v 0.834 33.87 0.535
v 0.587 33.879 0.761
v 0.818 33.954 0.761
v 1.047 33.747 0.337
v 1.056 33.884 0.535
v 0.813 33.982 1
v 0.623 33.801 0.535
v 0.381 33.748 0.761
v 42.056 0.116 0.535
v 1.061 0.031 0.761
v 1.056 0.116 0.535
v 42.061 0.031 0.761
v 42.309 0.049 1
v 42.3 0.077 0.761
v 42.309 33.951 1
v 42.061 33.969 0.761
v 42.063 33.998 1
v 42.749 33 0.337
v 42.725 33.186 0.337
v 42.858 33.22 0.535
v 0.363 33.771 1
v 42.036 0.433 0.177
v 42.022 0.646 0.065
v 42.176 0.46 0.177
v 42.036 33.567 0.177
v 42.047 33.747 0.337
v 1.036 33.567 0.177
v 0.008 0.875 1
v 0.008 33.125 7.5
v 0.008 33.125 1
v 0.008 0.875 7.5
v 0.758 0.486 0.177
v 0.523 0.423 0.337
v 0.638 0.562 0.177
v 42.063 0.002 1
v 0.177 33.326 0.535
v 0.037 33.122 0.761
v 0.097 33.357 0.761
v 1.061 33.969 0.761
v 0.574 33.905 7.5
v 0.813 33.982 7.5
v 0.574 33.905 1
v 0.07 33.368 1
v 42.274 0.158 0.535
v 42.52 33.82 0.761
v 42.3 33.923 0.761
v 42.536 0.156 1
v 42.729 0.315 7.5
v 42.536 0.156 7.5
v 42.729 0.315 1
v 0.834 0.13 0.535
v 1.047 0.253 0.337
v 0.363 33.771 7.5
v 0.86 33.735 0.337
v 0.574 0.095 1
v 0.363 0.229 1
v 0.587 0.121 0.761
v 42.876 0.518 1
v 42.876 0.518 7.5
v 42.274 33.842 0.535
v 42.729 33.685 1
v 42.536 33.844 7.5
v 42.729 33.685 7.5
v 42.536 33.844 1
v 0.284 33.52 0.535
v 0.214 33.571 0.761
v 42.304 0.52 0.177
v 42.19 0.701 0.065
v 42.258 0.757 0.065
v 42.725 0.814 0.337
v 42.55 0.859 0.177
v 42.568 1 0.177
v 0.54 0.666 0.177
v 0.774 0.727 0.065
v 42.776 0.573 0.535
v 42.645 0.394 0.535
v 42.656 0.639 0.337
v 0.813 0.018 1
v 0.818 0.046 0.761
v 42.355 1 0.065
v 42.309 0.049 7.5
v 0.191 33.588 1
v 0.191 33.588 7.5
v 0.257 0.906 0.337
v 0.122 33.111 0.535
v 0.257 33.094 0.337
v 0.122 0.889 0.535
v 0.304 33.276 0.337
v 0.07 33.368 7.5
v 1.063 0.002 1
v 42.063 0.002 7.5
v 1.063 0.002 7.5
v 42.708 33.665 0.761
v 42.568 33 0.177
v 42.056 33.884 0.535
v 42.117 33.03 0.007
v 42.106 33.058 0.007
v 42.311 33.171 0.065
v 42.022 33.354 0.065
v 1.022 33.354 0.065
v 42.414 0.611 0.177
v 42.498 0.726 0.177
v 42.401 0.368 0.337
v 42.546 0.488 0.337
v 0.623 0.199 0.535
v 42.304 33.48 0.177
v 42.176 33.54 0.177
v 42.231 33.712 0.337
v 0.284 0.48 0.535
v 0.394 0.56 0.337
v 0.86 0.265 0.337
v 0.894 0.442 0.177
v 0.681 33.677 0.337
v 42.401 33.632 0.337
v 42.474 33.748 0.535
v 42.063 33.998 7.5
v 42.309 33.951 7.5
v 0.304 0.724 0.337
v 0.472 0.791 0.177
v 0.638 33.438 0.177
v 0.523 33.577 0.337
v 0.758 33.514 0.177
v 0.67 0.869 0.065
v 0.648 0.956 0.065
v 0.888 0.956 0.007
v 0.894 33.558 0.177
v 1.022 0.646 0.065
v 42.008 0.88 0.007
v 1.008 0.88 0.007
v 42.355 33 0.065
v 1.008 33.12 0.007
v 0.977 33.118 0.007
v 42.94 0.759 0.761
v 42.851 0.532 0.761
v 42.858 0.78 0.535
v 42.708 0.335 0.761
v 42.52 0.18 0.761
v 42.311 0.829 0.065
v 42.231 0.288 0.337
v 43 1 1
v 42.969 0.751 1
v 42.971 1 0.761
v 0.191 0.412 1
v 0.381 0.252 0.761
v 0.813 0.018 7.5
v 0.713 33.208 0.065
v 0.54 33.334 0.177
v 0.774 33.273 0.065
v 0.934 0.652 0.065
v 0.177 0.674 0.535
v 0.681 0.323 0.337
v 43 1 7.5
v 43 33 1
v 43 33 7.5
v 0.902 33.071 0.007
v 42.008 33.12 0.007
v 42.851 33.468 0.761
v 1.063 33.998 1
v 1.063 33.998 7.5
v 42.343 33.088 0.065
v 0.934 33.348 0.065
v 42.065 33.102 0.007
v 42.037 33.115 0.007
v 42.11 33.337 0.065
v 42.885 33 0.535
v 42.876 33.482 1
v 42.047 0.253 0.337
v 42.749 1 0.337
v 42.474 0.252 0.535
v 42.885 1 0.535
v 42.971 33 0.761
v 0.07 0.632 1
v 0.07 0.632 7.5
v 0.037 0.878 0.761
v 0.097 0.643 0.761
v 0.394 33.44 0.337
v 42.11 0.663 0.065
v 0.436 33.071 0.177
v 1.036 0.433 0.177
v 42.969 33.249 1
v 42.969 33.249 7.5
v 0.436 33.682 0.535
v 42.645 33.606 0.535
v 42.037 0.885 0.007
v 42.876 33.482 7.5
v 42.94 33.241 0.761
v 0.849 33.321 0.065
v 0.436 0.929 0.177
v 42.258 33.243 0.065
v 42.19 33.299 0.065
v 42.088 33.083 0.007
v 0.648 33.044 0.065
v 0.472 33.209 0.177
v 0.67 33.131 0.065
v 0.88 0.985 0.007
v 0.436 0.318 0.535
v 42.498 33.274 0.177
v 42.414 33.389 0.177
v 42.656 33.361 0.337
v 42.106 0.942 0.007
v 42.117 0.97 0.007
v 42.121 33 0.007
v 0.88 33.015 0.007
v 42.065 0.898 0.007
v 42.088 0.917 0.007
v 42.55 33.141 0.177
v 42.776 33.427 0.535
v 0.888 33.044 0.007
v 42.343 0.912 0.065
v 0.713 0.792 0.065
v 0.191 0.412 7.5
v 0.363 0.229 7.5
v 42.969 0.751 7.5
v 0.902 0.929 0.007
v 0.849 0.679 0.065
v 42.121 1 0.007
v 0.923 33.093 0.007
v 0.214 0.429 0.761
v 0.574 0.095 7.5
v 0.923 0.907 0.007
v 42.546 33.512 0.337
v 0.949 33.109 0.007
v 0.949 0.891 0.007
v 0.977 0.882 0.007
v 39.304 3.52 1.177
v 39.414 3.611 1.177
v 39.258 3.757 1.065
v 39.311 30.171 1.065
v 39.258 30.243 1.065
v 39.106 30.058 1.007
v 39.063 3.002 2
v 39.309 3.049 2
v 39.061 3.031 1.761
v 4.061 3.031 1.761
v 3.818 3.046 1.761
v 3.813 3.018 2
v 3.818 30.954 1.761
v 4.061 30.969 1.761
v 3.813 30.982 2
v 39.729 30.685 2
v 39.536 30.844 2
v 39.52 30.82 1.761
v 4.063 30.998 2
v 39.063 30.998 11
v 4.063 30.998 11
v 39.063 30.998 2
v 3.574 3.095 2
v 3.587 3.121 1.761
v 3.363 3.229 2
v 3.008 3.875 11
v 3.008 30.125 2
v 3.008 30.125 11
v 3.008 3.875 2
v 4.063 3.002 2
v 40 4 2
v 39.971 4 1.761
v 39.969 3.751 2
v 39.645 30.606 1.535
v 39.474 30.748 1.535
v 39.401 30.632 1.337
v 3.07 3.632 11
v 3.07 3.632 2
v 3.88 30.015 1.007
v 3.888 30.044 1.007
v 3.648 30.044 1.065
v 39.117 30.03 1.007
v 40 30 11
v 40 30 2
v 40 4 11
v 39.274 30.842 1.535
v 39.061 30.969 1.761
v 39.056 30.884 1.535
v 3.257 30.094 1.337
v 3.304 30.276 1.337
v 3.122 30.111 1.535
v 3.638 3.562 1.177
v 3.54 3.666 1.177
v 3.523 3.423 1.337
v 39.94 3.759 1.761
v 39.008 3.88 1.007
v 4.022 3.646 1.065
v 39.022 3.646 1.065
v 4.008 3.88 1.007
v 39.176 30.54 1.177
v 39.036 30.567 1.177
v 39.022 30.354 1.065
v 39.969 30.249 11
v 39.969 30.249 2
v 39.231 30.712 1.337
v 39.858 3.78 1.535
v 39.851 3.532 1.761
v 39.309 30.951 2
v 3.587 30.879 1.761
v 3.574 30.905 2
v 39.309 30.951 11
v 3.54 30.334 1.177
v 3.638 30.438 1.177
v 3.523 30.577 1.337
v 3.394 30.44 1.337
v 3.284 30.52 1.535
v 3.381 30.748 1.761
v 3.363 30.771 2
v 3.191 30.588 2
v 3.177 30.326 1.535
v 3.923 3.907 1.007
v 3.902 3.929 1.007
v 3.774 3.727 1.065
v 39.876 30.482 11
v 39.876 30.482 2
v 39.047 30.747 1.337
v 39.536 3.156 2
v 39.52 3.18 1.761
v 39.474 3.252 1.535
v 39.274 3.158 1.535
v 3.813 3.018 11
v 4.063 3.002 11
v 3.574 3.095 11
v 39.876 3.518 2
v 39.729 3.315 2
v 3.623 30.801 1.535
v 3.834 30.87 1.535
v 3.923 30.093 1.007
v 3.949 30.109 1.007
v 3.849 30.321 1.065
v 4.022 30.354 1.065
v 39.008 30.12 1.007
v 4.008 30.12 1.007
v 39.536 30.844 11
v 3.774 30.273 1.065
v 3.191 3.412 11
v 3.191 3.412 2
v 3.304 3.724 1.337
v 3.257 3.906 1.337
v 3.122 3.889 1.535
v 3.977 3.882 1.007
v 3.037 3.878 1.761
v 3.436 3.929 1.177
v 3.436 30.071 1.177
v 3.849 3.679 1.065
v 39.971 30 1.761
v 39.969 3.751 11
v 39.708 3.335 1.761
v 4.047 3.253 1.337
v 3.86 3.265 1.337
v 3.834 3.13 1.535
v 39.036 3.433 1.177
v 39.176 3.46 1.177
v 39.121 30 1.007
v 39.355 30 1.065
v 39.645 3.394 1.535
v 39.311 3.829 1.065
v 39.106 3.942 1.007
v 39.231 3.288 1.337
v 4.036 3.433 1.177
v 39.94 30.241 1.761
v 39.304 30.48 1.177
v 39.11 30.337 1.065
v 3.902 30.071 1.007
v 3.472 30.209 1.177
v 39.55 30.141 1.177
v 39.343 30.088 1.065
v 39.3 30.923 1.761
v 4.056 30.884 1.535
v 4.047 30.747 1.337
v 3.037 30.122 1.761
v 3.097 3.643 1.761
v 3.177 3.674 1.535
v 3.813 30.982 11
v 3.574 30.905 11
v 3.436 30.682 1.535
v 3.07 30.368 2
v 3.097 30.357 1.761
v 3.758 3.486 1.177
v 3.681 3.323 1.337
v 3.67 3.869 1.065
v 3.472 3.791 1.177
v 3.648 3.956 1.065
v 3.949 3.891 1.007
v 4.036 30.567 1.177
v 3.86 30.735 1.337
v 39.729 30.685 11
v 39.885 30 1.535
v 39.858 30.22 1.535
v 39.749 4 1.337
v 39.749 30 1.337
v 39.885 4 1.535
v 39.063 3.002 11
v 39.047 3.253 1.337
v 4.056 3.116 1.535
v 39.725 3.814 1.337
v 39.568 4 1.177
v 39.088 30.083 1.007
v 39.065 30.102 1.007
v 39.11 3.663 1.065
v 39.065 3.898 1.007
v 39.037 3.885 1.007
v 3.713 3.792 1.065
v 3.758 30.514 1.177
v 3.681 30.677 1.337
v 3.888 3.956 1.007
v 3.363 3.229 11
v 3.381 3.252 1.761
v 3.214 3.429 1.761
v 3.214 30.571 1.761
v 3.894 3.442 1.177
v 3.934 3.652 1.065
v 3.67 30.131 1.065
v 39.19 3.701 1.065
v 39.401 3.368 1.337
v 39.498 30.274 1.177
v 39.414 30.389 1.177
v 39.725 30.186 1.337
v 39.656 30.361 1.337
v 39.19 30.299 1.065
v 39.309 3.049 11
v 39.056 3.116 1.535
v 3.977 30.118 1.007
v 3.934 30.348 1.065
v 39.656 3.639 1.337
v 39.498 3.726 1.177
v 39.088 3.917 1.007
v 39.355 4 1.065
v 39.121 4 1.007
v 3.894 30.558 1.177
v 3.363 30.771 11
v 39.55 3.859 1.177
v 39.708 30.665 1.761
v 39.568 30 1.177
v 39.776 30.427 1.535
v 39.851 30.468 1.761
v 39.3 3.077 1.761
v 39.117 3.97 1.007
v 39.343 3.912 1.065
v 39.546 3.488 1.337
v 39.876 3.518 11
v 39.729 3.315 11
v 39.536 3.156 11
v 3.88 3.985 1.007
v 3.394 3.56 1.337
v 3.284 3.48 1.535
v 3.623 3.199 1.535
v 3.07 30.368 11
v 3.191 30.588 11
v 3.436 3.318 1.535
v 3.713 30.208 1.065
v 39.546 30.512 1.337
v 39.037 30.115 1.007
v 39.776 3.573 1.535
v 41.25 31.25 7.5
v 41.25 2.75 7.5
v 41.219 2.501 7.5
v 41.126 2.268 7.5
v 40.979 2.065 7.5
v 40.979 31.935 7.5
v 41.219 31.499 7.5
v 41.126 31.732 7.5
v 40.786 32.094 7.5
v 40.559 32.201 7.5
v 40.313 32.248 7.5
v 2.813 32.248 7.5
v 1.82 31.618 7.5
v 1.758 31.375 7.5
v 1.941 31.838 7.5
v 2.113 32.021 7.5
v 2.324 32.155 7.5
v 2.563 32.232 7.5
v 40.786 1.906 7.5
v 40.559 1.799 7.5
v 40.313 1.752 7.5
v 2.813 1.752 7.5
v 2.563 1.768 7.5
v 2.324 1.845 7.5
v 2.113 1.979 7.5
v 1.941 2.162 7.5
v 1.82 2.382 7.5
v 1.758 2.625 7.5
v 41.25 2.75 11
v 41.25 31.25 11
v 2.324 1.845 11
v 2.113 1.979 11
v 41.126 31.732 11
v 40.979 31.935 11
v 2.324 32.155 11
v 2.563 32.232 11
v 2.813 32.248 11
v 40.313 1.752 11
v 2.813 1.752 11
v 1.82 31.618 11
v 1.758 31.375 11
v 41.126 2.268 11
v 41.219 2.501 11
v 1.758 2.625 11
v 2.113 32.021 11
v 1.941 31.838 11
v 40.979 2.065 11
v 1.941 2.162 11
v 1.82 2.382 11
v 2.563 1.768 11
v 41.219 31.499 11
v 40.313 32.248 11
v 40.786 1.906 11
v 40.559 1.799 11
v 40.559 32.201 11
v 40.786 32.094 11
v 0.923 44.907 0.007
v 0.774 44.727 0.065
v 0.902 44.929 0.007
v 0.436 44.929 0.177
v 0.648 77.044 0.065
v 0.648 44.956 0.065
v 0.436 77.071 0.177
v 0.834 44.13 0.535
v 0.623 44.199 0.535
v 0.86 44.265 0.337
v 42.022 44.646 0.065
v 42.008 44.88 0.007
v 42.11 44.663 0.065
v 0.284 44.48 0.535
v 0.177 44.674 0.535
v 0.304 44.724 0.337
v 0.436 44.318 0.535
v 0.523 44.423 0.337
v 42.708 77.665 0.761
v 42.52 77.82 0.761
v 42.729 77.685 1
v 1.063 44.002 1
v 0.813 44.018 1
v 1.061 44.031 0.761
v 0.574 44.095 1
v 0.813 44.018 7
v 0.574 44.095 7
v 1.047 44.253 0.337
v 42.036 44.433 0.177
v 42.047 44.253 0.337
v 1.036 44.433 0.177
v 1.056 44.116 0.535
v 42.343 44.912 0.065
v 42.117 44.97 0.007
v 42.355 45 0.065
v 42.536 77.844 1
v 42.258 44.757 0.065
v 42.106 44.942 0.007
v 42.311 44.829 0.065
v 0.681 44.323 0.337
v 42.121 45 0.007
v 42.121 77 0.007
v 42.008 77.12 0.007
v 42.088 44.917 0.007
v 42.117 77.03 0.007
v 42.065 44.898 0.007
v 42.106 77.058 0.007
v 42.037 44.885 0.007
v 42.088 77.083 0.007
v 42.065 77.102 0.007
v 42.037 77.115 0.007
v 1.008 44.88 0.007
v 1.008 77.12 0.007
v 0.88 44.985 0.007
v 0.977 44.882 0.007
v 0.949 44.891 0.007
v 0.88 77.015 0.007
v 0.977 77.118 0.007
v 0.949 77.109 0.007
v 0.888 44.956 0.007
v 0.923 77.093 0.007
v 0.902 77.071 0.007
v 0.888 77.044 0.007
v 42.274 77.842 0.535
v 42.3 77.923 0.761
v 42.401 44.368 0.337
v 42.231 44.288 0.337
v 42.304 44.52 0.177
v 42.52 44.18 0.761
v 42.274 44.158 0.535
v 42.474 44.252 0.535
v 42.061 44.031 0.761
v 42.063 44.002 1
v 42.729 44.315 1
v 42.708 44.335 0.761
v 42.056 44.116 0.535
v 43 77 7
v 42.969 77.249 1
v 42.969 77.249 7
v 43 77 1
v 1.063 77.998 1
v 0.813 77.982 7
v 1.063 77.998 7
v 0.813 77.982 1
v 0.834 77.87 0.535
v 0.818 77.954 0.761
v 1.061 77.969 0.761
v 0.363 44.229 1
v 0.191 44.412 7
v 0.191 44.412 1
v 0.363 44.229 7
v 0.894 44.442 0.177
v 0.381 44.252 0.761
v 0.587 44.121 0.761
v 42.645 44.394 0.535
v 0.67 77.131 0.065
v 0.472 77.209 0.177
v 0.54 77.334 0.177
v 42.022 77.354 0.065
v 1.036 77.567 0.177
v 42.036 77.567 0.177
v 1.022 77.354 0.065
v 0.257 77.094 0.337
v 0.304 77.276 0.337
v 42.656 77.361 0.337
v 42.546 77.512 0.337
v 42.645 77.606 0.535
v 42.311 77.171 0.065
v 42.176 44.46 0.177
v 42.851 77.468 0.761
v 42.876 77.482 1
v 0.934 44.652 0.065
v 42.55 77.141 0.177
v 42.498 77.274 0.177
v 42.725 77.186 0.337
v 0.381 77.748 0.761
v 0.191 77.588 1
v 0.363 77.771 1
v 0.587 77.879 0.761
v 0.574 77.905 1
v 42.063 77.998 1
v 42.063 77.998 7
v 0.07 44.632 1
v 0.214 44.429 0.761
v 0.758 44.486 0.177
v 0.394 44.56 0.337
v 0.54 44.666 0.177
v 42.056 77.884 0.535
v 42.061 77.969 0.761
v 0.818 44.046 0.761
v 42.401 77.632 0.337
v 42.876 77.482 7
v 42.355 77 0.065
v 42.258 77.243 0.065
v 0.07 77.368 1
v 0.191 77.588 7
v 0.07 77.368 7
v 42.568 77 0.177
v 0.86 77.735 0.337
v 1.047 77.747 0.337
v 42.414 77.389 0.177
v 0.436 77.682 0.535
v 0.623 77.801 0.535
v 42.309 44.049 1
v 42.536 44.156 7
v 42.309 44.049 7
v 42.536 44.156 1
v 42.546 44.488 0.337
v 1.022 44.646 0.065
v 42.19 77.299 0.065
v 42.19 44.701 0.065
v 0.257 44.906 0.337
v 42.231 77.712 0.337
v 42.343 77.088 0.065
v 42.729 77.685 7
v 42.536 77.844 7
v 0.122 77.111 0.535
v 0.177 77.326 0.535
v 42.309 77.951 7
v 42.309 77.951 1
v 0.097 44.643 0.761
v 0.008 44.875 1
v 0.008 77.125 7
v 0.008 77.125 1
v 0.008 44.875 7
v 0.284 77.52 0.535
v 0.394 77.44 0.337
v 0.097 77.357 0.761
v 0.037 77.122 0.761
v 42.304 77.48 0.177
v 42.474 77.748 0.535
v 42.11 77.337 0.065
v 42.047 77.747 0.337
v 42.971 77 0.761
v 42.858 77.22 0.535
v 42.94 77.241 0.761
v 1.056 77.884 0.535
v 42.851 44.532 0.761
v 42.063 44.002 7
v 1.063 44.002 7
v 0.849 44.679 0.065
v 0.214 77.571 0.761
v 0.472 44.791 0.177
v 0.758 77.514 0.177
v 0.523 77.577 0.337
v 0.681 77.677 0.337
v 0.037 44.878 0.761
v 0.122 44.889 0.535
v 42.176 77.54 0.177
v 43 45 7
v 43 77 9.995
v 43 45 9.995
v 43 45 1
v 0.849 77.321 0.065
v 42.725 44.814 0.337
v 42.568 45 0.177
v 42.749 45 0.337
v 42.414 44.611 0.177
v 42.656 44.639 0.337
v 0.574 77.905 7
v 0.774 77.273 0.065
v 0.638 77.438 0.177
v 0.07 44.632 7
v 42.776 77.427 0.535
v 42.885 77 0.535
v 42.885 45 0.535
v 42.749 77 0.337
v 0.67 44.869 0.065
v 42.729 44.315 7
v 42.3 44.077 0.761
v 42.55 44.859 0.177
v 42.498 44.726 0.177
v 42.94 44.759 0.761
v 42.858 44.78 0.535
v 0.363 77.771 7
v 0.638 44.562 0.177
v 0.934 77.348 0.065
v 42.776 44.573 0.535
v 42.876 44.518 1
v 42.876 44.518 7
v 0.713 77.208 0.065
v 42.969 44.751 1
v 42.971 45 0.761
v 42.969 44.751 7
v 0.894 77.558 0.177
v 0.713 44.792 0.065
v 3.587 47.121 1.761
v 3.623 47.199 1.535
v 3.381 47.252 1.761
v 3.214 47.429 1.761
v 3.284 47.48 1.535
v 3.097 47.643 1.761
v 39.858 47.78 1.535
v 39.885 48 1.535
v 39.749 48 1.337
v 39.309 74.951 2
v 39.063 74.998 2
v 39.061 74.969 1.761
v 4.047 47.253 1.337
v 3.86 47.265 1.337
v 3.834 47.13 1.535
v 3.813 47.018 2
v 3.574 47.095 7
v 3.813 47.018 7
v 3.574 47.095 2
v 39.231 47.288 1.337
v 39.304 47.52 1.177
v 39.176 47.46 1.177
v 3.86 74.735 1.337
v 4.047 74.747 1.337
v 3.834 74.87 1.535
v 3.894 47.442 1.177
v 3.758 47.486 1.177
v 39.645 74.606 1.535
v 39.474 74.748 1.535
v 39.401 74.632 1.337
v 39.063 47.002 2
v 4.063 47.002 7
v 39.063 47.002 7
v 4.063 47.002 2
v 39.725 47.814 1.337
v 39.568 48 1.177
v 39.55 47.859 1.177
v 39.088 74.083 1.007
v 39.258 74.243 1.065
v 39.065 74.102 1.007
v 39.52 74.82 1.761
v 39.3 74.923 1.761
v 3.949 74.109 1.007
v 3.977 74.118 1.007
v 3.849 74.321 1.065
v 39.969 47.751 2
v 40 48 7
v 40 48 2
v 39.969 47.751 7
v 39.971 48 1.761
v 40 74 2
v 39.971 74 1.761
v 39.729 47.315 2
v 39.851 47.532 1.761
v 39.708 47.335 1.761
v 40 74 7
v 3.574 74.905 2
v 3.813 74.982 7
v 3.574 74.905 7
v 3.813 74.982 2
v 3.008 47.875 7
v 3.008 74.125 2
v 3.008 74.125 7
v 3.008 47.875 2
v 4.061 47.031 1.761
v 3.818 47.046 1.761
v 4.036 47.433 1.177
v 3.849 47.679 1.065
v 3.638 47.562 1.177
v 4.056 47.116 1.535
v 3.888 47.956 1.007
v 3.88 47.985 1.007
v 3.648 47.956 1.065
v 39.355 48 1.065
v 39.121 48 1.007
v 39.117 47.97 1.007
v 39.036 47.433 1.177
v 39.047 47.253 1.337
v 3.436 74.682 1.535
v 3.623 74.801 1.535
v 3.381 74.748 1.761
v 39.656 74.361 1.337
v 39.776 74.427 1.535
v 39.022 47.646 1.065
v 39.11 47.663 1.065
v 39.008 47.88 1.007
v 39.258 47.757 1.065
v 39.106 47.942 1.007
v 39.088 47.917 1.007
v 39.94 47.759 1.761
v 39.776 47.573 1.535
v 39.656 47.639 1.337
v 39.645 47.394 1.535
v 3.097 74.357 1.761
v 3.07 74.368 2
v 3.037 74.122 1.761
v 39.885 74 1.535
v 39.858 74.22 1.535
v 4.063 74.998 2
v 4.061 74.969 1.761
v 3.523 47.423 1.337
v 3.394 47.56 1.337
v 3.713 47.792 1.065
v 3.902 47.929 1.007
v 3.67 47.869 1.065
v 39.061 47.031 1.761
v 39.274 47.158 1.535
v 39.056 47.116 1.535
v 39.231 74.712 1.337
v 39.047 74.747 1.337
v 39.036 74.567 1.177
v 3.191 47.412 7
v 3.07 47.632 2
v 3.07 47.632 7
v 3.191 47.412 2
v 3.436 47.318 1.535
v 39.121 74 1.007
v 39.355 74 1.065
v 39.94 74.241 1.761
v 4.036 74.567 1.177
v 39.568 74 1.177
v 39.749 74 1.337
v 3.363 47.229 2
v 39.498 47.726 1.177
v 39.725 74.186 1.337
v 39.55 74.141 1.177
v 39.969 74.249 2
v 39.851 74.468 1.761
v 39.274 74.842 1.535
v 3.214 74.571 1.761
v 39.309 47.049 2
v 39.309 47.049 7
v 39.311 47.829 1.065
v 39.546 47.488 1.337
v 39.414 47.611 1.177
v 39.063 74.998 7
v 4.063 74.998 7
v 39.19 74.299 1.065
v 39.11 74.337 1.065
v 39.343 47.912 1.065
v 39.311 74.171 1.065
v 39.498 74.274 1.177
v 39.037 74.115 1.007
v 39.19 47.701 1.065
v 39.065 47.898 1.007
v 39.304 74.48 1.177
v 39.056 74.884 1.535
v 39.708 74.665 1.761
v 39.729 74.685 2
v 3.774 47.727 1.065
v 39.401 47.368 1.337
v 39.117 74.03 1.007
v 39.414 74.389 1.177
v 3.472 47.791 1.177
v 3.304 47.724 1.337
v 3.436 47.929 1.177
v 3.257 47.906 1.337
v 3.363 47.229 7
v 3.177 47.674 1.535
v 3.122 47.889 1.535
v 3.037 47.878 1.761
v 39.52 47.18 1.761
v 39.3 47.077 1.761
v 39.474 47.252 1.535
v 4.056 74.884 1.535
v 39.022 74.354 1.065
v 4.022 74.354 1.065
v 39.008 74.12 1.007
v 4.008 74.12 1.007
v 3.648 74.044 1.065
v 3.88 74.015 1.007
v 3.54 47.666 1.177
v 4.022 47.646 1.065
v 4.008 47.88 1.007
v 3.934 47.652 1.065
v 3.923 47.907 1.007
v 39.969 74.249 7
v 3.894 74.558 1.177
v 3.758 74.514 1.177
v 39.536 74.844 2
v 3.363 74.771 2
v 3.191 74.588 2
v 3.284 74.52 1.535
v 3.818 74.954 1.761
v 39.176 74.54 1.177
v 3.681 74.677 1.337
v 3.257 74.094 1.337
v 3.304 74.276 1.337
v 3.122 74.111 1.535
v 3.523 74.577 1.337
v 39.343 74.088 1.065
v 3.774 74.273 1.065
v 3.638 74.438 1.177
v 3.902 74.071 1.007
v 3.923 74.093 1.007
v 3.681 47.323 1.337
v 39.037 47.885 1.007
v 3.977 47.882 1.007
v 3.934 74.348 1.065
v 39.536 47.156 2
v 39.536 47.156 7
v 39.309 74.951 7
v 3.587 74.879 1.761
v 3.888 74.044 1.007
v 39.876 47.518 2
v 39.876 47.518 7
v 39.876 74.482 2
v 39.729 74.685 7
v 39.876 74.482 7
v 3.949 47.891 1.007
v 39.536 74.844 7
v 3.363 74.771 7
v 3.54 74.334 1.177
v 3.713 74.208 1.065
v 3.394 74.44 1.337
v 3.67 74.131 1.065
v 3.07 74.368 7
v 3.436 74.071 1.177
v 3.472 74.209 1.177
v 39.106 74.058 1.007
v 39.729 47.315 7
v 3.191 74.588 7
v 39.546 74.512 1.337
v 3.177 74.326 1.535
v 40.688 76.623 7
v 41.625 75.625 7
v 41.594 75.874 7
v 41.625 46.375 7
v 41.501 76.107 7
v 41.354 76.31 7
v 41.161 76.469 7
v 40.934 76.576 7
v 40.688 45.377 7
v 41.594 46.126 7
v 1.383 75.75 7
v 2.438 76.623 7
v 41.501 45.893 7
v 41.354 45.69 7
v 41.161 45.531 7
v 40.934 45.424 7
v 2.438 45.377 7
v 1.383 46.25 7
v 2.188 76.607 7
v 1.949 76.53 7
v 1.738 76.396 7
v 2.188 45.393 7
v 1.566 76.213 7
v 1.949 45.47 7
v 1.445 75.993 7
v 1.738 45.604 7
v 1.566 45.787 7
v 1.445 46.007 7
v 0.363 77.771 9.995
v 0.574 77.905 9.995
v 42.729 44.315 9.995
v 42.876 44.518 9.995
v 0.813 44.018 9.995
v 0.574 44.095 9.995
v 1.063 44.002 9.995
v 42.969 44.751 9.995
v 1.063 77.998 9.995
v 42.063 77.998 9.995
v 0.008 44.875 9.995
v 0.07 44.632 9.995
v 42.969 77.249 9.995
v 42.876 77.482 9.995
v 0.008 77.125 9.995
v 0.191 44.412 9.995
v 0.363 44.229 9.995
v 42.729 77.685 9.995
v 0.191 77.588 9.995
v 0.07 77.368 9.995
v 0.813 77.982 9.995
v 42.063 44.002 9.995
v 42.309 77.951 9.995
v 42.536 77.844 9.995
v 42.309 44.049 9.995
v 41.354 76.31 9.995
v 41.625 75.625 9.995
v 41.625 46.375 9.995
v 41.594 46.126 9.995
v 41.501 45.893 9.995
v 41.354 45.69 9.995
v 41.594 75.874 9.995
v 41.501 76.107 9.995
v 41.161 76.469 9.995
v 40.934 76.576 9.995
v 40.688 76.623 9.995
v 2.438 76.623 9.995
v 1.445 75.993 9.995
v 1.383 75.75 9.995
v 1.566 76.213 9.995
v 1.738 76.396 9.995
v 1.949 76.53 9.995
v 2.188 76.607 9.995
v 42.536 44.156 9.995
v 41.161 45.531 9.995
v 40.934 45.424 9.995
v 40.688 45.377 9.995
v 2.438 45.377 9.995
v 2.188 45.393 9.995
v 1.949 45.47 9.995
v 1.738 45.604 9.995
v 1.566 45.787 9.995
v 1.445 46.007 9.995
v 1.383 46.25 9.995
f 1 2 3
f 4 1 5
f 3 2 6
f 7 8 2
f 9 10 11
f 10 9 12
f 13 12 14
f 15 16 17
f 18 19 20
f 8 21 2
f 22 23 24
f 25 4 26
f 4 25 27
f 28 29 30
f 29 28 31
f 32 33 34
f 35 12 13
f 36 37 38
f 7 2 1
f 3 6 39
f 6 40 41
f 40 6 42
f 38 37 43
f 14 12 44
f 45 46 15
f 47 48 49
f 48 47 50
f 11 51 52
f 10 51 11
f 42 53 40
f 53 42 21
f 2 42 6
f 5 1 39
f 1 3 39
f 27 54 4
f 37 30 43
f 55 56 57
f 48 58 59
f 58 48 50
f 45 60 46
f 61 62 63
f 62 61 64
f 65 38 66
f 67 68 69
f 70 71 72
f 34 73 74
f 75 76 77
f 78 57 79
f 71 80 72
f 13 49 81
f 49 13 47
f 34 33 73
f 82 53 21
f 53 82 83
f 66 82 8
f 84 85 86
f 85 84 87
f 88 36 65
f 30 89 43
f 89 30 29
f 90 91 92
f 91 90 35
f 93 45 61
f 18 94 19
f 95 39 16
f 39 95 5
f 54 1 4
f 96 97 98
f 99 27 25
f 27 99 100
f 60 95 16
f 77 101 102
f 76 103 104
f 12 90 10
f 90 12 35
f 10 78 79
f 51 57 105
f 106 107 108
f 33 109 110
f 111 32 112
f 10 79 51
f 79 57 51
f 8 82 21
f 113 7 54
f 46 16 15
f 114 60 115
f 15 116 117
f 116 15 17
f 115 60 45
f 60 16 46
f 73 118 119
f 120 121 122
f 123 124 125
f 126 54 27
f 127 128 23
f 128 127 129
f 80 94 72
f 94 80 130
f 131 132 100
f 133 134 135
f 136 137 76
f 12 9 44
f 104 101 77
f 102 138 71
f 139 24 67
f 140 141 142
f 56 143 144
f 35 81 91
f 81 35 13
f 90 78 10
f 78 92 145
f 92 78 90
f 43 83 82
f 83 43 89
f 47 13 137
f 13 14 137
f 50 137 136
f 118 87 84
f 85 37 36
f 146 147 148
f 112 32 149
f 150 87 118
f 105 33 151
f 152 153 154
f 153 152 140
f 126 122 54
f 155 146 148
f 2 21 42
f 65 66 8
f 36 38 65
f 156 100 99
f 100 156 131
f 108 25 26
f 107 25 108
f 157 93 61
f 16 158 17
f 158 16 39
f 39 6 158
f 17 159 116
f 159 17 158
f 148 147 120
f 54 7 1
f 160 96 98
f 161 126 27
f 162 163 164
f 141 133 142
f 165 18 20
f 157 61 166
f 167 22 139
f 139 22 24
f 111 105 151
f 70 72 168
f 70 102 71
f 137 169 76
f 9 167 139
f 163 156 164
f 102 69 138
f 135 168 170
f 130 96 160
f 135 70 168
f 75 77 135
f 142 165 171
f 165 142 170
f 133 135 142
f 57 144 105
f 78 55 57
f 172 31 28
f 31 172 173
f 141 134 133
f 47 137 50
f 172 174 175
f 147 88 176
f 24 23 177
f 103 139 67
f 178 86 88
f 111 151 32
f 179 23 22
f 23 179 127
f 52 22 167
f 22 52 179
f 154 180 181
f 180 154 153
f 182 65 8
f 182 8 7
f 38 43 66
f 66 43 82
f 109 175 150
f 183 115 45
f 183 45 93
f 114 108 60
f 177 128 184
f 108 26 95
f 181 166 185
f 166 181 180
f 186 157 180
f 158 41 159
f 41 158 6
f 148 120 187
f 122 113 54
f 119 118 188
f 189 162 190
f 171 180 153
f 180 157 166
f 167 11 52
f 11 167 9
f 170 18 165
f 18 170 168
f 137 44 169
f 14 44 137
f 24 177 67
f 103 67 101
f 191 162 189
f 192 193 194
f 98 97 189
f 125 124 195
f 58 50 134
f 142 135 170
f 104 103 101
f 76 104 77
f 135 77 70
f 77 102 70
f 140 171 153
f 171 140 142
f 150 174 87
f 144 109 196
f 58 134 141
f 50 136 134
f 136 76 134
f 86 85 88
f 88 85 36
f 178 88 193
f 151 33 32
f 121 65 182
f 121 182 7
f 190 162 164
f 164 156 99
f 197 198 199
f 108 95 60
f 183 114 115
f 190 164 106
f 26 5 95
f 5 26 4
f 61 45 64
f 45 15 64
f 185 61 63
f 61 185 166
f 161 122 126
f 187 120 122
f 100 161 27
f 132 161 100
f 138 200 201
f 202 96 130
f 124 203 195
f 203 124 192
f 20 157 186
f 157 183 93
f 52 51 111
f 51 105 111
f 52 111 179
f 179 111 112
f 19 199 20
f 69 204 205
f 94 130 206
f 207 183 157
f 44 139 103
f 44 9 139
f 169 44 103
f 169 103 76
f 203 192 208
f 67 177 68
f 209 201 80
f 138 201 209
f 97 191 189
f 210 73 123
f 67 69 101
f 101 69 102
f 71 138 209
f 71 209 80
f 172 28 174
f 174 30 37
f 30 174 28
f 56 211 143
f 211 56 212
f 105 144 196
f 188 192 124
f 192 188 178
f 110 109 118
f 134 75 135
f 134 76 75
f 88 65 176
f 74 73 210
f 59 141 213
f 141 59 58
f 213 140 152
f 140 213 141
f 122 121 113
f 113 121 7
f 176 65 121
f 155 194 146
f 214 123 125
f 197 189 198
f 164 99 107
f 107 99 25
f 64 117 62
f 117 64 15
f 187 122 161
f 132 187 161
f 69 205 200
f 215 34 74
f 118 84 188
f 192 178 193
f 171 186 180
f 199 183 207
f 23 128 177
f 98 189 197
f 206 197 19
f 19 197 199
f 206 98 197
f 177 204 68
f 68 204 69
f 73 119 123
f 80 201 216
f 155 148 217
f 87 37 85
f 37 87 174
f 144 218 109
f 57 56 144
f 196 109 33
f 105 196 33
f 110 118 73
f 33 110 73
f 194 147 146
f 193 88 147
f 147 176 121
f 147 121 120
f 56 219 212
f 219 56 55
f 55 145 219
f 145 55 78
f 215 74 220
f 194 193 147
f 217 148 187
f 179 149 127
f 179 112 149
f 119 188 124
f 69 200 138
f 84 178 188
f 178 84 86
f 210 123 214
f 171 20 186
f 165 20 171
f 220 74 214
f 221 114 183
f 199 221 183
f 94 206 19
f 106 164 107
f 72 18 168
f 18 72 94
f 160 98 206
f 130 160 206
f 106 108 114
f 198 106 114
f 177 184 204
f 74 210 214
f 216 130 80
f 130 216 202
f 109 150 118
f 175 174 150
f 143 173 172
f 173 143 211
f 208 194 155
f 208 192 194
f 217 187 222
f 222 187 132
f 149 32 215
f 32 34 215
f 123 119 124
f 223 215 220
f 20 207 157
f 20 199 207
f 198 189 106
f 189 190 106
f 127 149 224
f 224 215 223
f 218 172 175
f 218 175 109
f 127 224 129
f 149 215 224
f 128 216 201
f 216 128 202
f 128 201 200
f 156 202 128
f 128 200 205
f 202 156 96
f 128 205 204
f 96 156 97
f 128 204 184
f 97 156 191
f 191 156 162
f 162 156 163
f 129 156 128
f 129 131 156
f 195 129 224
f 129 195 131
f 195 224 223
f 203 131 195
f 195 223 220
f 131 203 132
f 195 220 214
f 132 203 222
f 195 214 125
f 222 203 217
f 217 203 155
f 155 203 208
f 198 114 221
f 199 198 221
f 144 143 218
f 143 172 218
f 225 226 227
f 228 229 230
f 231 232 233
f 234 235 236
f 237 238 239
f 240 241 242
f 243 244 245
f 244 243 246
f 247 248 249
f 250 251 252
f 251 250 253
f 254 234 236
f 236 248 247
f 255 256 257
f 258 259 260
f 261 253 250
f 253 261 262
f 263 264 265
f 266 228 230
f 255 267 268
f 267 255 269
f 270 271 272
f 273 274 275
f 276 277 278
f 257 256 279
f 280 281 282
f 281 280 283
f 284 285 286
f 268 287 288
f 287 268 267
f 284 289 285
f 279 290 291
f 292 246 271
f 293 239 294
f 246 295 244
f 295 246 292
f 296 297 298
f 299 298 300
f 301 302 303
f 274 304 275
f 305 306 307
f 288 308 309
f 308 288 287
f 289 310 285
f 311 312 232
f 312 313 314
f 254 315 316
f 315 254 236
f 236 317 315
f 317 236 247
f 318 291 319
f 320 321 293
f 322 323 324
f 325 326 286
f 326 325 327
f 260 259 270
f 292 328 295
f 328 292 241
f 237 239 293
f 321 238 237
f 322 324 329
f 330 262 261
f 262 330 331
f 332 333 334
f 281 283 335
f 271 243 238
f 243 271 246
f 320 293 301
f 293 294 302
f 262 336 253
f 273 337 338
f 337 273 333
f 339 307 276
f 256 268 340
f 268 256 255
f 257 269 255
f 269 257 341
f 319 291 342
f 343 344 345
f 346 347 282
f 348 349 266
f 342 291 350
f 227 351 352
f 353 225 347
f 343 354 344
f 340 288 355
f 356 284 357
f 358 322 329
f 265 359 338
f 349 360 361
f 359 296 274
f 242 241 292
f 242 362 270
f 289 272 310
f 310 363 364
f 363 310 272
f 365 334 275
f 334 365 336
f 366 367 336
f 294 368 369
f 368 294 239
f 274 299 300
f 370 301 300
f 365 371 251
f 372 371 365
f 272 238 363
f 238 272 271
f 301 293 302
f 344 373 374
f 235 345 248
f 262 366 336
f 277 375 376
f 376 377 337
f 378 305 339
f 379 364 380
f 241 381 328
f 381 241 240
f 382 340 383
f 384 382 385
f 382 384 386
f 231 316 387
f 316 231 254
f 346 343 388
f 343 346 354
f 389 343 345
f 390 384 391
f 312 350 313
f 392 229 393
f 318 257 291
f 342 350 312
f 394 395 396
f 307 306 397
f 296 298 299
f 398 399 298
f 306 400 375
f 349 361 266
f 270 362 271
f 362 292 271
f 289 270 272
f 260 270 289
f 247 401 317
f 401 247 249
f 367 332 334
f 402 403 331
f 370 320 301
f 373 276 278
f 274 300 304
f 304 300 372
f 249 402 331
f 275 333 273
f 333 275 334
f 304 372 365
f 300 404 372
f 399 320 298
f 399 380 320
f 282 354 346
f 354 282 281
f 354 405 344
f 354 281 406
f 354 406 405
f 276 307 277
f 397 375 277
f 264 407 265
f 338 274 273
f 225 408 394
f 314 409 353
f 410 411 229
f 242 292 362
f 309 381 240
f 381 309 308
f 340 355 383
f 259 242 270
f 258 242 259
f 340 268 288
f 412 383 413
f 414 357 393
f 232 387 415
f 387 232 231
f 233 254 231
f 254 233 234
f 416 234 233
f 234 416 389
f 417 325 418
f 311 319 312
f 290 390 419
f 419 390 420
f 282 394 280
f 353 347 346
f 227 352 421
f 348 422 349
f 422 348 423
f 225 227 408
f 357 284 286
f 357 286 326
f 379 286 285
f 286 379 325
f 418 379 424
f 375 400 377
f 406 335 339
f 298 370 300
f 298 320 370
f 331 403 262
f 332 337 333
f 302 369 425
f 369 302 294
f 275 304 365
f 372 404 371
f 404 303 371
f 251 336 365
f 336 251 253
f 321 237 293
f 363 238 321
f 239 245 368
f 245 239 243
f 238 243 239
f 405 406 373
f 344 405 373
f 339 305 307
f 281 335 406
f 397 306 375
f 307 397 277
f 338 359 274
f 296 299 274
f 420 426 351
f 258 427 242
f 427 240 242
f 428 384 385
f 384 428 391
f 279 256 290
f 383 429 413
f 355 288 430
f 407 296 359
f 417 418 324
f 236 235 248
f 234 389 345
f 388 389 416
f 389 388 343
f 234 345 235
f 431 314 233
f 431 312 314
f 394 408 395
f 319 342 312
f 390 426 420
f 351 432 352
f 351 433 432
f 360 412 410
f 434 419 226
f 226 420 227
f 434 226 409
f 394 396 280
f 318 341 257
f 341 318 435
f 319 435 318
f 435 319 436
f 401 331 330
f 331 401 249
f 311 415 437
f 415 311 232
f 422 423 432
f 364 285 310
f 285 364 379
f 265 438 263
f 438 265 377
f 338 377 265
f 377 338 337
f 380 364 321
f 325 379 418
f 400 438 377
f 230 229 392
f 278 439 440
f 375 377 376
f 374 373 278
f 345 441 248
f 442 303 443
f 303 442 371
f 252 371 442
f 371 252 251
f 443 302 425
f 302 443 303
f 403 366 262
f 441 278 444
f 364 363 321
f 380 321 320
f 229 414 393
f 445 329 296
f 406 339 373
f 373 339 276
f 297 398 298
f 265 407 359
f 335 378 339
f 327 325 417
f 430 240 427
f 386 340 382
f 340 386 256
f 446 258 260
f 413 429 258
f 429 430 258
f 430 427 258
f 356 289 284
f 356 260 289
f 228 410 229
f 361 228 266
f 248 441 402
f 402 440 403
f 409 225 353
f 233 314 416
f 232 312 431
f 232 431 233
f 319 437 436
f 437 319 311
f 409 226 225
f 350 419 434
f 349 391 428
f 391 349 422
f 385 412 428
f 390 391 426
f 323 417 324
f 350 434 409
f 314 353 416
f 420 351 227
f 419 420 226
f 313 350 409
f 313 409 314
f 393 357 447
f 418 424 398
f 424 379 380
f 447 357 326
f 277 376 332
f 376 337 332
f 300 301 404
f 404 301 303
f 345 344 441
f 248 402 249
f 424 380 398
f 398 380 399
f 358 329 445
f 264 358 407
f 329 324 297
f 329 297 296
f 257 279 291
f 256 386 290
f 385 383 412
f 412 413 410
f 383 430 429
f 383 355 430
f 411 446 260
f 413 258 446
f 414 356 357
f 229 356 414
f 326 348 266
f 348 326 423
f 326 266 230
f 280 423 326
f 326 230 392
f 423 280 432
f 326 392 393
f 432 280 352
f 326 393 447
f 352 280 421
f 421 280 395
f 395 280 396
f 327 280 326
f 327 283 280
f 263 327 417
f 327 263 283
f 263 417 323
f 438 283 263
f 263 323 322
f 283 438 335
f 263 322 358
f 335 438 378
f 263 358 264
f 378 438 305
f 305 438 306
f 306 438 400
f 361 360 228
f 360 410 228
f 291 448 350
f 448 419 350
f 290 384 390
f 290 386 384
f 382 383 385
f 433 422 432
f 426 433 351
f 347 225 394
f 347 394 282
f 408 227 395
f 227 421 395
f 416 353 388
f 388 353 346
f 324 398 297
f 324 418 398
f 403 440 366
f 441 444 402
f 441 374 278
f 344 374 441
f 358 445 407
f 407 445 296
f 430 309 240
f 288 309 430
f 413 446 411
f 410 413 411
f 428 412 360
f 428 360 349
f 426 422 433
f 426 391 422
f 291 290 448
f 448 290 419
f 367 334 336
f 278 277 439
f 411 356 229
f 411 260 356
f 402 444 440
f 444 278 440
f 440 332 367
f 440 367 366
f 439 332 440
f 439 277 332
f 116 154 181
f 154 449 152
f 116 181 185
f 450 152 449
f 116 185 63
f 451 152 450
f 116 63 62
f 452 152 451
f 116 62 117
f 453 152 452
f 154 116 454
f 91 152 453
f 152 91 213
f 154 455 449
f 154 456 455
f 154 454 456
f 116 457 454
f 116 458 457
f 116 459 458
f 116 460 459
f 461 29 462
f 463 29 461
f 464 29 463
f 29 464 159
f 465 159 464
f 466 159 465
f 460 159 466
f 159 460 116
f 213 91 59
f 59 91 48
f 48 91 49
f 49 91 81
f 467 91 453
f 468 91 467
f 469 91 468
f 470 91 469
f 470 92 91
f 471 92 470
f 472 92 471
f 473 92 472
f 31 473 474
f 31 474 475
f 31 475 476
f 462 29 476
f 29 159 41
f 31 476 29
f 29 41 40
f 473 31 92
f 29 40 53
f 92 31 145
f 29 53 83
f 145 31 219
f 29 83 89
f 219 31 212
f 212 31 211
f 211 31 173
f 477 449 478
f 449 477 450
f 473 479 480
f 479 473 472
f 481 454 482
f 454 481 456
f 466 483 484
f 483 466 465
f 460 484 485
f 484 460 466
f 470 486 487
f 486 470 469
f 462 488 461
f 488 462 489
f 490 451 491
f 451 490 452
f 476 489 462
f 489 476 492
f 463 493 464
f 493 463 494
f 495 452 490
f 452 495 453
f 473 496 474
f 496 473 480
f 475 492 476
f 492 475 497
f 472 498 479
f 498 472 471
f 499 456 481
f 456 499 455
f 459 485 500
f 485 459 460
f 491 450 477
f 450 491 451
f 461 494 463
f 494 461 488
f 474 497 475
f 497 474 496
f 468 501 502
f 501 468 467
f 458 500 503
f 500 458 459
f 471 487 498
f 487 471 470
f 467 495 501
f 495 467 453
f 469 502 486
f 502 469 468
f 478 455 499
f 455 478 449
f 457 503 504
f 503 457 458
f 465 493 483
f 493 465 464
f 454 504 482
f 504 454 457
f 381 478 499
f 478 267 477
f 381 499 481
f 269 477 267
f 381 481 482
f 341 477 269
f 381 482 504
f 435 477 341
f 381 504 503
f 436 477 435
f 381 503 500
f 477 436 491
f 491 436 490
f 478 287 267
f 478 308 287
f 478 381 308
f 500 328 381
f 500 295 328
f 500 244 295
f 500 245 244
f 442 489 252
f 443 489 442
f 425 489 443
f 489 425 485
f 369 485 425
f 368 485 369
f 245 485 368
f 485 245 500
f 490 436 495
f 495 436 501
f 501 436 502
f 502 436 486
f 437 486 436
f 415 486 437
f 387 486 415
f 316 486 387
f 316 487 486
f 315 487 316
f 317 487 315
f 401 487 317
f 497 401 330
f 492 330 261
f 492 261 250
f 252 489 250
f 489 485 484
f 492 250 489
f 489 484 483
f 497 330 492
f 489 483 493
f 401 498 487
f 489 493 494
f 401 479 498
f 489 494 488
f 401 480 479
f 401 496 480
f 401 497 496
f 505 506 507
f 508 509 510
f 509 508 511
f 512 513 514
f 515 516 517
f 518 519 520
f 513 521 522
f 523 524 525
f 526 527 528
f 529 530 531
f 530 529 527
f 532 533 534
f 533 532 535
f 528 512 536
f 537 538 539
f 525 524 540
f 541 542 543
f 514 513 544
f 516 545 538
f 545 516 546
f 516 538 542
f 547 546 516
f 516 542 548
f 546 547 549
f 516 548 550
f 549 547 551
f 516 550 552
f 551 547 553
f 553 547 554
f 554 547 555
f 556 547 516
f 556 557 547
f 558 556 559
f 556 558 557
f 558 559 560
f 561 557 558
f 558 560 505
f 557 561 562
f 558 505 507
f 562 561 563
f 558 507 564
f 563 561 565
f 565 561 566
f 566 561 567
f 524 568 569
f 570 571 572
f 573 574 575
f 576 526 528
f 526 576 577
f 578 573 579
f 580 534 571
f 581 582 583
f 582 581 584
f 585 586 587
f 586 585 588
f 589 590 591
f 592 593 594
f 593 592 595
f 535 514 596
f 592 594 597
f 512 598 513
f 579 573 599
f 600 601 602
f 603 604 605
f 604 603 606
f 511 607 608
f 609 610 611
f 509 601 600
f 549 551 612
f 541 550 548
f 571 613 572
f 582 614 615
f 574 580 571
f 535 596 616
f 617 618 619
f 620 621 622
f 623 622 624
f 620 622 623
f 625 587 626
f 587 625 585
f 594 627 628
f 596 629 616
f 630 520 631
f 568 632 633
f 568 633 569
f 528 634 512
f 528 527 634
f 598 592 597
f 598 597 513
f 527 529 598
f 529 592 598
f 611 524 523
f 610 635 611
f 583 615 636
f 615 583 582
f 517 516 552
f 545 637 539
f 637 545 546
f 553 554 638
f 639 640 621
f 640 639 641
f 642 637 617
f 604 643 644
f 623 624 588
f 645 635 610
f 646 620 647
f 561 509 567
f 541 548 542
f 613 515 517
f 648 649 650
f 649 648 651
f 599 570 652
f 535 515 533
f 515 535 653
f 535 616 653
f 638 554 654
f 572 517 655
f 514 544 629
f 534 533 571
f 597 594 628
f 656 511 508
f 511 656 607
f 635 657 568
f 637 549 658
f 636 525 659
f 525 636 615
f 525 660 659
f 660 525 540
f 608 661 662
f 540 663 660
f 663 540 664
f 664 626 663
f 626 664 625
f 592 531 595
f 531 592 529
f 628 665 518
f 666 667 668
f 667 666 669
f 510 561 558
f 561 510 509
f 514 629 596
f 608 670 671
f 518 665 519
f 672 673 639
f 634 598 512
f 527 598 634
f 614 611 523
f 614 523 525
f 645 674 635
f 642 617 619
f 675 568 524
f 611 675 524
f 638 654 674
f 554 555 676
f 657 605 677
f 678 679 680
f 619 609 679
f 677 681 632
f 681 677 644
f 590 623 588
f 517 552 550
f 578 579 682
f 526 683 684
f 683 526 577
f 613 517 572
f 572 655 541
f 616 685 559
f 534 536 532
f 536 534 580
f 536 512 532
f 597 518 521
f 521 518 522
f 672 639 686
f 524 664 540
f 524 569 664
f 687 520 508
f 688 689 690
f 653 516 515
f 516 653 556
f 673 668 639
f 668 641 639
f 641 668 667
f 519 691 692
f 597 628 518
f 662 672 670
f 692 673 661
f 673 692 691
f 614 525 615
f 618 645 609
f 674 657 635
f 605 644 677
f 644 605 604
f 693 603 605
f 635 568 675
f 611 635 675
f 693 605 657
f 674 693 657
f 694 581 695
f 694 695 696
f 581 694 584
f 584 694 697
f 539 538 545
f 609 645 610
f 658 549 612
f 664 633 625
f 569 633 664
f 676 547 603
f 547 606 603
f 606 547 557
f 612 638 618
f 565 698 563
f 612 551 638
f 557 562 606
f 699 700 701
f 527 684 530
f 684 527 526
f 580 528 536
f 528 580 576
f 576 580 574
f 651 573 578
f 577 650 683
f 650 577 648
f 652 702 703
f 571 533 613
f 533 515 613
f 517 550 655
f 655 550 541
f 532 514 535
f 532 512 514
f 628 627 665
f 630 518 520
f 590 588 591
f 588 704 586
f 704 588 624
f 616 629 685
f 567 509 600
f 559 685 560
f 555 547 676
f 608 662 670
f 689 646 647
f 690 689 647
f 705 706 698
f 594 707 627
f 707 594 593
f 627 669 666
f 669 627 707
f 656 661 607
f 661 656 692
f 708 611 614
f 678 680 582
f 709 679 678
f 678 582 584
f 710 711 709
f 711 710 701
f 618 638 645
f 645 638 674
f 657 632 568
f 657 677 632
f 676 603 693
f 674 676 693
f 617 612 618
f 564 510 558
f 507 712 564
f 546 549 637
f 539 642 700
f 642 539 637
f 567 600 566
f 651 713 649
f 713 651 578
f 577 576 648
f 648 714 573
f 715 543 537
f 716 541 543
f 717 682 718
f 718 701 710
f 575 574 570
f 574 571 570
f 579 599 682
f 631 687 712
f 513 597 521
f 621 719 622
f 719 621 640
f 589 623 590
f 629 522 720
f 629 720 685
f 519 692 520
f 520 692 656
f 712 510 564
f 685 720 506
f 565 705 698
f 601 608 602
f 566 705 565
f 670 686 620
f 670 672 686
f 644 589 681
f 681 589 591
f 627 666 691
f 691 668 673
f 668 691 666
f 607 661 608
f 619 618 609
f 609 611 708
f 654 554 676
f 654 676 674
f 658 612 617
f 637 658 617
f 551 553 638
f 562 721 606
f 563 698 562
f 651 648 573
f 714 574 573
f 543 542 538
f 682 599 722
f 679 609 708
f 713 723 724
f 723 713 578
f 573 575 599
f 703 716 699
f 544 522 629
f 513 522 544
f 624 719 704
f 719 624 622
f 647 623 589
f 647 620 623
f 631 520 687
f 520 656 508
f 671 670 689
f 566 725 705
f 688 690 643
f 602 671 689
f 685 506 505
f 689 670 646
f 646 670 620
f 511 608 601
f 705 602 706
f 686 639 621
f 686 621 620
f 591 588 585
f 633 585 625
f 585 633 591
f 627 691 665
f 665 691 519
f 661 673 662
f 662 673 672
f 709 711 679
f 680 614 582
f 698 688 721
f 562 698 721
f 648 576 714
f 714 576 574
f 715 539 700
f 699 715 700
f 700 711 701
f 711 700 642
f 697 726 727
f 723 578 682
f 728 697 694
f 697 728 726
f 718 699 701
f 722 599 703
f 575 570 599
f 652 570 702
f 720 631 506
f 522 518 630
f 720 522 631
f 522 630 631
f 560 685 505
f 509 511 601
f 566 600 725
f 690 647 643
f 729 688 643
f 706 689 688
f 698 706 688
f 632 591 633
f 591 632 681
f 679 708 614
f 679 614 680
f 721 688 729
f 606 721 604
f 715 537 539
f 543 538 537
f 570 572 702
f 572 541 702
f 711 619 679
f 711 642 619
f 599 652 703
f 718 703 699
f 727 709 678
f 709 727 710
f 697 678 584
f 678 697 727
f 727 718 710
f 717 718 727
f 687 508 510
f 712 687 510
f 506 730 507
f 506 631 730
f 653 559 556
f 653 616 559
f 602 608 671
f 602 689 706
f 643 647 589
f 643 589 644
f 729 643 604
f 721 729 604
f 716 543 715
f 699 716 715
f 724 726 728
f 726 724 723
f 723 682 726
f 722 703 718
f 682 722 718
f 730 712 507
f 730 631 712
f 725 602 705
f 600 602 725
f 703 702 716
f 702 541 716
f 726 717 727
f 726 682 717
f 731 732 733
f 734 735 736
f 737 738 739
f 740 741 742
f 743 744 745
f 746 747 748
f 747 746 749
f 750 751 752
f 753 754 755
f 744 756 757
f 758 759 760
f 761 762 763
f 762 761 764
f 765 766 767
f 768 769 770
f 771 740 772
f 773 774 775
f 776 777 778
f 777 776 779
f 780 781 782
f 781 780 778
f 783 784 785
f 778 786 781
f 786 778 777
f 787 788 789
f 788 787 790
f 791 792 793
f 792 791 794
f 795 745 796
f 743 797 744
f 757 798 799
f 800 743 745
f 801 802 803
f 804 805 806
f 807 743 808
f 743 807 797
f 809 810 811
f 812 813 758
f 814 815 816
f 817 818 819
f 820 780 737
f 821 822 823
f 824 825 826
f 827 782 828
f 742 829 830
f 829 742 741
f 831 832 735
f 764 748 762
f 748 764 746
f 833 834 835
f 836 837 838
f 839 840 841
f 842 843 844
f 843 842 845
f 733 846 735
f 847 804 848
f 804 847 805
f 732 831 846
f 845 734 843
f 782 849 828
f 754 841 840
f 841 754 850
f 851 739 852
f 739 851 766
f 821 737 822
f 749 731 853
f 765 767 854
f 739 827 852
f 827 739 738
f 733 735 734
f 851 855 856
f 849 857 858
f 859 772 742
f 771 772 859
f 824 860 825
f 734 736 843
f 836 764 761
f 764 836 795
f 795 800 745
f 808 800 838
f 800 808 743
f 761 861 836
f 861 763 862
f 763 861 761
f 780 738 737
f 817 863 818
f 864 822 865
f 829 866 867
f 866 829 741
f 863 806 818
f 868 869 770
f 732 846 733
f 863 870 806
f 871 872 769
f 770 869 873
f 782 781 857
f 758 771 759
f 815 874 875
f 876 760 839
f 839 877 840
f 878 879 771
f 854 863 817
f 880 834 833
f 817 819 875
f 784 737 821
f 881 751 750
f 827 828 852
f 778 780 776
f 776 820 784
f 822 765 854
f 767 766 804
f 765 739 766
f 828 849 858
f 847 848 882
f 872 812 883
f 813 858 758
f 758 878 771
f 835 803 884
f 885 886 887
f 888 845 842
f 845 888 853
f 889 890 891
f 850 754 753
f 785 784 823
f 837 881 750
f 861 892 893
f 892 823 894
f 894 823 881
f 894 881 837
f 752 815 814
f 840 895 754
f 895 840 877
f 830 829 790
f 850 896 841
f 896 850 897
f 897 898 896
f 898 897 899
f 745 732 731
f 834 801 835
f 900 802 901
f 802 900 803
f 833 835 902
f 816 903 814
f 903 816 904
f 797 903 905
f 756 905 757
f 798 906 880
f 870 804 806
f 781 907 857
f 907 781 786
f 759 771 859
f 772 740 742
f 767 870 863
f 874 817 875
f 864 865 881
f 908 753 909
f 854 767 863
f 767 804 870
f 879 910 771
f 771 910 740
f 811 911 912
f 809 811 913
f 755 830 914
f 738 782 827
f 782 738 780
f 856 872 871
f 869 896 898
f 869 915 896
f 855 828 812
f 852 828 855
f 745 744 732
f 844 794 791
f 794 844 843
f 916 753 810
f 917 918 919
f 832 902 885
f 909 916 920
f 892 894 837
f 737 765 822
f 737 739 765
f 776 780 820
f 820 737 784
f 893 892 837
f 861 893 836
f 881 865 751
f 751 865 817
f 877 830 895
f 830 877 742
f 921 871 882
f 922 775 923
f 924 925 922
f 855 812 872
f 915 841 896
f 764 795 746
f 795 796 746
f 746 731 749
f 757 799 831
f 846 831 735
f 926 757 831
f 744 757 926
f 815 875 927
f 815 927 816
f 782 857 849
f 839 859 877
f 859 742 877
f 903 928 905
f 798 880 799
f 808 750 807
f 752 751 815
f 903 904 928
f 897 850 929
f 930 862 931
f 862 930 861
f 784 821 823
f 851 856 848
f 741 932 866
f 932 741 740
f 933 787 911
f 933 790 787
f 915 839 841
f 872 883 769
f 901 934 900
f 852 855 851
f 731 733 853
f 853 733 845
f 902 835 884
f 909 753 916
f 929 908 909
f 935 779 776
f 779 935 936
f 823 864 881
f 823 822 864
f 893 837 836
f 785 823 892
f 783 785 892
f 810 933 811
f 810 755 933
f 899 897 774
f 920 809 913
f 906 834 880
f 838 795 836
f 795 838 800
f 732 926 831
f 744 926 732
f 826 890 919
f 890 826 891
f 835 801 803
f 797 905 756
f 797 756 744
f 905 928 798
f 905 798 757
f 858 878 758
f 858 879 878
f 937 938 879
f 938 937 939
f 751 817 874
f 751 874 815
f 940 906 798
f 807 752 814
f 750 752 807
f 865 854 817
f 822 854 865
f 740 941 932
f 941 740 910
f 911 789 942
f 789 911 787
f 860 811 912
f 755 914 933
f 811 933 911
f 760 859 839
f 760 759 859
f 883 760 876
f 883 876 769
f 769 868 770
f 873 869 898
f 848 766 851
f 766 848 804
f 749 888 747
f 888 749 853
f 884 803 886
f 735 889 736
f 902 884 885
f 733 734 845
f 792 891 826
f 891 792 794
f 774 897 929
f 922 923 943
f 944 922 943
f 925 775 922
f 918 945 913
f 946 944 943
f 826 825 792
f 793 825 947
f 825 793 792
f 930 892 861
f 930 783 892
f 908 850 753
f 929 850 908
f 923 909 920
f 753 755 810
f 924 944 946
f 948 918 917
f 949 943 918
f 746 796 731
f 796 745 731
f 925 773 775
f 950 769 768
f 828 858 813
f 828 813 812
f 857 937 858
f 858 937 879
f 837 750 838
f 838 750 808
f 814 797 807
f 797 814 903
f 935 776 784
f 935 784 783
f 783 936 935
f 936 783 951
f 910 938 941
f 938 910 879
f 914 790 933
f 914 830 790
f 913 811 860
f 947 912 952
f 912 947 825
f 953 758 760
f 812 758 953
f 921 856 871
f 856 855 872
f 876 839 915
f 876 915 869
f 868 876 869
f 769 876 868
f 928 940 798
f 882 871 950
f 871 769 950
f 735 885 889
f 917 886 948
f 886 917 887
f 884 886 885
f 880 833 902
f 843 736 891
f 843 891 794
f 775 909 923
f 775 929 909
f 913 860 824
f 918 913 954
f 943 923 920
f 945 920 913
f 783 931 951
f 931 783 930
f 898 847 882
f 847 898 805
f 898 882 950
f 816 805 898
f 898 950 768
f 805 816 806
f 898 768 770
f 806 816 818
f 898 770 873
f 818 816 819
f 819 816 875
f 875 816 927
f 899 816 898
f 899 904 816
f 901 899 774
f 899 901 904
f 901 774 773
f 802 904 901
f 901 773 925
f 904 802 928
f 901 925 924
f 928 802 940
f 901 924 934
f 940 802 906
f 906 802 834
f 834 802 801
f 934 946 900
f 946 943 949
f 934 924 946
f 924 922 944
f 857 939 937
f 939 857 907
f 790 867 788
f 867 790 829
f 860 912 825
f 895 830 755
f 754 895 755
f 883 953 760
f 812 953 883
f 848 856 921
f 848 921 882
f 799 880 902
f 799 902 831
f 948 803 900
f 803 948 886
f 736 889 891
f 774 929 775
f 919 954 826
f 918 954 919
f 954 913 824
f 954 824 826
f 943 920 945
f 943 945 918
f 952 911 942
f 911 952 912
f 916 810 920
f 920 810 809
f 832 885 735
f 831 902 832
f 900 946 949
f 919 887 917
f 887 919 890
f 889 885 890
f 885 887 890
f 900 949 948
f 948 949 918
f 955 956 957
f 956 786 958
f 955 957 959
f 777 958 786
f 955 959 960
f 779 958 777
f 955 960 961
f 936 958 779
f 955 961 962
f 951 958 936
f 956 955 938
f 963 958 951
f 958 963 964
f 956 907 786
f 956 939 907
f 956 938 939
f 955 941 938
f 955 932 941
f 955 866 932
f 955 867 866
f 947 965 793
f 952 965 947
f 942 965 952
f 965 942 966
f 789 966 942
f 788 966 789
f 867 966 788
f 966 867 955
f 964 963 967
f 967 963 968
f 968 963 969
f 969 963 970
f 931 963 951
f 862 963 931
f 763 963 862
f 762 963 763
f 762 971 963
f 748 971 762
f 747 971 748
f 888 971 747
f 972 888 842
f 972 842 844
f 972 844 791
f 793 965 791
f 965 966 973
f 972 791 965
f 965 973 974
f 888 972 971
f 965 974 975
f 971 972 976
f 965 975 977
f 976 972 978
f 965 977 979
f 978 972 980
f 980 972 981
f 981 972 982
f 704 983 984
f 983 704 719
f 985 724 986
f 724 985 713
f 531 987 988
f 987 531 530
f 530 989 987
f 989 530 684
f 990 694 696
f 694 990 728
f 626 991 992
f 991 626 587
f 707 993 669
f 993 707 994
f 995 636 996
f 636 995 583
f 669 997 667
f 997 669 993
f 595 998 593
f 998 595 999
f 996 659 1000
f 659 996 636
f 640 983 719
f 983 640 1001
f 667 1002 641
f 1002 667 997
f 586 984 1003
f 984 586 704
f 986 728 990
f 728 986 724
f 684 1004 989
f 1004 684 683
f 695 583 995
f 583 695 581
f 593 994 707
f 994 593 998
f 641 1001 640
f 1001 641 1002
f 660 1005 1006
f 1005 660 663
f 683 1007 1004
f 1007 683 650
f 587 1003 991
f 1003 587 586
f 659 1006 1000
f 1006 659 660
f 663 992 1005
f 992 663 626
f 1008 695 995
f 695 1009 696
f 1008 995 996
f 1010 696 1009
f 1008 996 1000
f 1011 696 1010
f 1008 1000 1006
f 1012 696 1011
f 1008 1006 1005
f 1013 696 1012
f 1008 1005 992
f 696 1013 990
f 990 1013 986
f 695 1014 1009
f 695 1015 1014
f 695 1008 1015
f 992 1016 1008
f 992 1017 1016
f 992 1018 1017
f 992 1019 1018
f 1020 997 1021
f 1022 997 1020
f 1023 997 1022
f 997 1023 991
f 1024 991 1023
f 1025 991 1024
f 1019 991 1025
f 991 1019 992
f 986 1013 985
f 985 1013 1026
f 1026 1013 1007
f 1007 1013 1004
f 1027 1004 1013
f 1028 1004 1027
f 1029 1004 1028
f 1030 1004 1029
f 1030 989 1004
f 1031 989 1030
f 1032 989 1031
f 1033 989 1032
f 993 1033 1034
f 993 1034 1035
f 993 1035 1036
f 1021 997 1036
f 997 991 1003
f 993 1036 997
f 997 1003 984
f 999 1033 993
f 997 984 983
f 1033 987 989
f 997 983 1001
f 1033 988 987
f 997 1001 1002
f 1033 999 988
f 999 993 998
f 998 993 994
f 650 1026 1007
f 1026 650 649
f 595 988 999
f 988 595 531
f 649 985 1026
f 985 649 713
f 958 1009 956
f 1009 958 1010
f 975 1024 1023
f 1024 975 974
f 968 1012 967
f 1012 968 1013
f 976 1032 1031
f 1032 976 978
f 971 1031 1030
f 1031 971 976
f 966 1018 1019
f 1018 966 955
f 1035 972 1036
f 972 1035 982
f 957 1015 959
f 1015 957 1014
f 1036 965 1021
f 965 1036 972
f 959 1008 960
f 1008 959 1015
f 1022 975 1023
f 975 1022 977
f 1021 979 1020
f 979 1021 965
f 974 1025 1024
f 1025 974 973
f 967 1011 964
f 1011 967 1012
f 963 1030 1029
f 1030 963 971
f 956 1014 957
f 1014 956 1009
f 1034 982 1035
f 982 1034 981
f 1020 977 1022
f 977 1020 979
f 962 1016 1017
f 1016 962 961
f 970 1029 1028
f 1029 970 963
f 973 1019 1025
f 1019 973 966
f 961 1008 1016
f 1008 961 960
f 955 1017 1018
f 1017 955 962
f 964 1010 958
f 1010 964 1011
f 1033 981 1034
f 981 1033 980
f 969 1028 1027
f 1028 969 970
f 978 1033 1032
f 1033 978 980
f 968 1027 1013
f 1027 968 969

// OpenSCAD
//---------------------------------------------------------
//   YAPP_ridgeSlack test
//---------------------------------------------------------
include <./library/YAPPgenerator_v16.scad>

// Note: length/lengte refers to X axis, 
//       width/breedte to Y, 
//       height/hoogte to Z

/*
      padding-back|<------pcb length --->|<padding-front
                            RIGHT
        0    X-as ---> 
        +----------------------------------------+   ---
        |                                        |    ^
        |                                        |   padding-right 
        |                                        |    v
        |    -5,y +----------------------+       |   ---              
 B    Y |         | 0,y              x,y |       |     ^              F
 A    - |         |                      |       |     |              R
 C    a |         |                      |       |     | pcb width    O
 K    s |         |                      |       |     |              N
        |         | 0,0              x,0 |       |     v              T
      ^ |    -5,0 +----------------------+       |   ---
      | |                                        |    padding-left
      0 +----------------------------------------+   ---
        0    X-as --->
                          LEFT
*/

printLidShell       = true;
printBaseShell      = true;

// Edit these parameters for your own board dimensions
wallThickness       = 3;
basePlaneThickness  = 1.0;
lidPlaneThickness   = 1.0;

baseWallHeight      = 10;
lidWallHeight       = 6;

//-- D E B U G -------------------
showSideBySide      = true;
onLidGap            = 1;
shiftLid            = 0;
hideLidWalls        = false;
colorLid            = "yellow";
hideBaseWalls       = false;
colorBase           = "white";
showPCB             = false;
showMarkers         = false;
inspectX            = 0;  //-> 0=none (>0 from front, <0 from back)
inspectY            = 0;  //-> 0=none (>0 from left, <0 from right)
//-- D E B U G -------------------

// Total height of box = basePlaneThickness + lidPlaneThickness 
//                     + baseWallHeight + lidWallHeight
pcbLength           = 35.0;
pcbWidth            = 26.0;
pcbThickness        = 1.0;
                            
// padding between pcb and inside wall
paddingFront        = 1;
paddingBack         = 1;
paddingRight        = 1;
paddingLeft         = 1;

// ridge where base and lid off box can overlap
// Make sure this isn't less than lidWallHeight
ridgeHeight         = 3.5;
ridgeSlack          = 0.5;
roundRadius         = 1.0;

// How much the PCB needs to be raised from the base
// to leave room for solderings and whatnot
standoffHeight      = 2.0;
pinDiameter         = 1.8;
pinHoleSlack        = 0.1;
standoffDiameter    = 4;


//-- pcb_standoffs  -- origin is pcb[0,0,0]
// (0) = posx
// (1) = posy
// (2) = { yappBoth | yappLidOnly | yappBaseOnly }
// (3) = { yappHole, YappPin }
pcbStands =     [
                ];

//-- Lid plane    -- origin is pcb[0,0,0]
// (0) = posx
// (1) = posy
// (2) = width
// (3) = length
// (4) = angle
// (5) = { yappRectangle | yappCircle }
// (6) = { yappCenter }
cutoutsLid =    [
                ];

//-- base plane    -- origin is pcb[0,0,0]
// (0) = posx
// (1) = posy
// (2) = width
// (3) = length
// (4) = angle
// (5) = { yappRectangle | yappCircle }
// (6) = { yappCenter }
cutoutsBase =   [
                ];

//-- front plane  -- origin is pcb[0,0,0]
// (0) = posy
// (1) = posz
// (2) = width
// (3) = height
// (4) = angle
// (5) = { yappRectangle | yappCircle }
// (6) = { yappCenter }
cutoutsFront =  [
                ];

//-- left plane   -- origin is pcb[0,0,0]
// (0) = posx
// (1) = posz
// (2) = width
// (3) = height
// (4) = angle
// (5) = { yappRectangle | yappCircle }
// (6) = { yappCenter }
cutoutsLeft =   [
                ];

//-- snap Joins -- origen = box[x0,y0]
// (0) = posx | posy
// (1) = width
// (2..5) = yappLeft / yappRight / yappFront / yappBack (one or more)
// (n) = { yappSymmetric }
snapJoins   =   [
                ];

//-- origin of labels is box [0,0,0]
// (0) = posx
// (1) = posy/z
// (2) = orientation
// (3) = plane {lid | base | left | right | front | back }
// (4) = font
// (5) = size
// (6) = "label text"
labelsPlane =   [
                ];

//--- this is where the magic happens ---
YAPPgenerate();
